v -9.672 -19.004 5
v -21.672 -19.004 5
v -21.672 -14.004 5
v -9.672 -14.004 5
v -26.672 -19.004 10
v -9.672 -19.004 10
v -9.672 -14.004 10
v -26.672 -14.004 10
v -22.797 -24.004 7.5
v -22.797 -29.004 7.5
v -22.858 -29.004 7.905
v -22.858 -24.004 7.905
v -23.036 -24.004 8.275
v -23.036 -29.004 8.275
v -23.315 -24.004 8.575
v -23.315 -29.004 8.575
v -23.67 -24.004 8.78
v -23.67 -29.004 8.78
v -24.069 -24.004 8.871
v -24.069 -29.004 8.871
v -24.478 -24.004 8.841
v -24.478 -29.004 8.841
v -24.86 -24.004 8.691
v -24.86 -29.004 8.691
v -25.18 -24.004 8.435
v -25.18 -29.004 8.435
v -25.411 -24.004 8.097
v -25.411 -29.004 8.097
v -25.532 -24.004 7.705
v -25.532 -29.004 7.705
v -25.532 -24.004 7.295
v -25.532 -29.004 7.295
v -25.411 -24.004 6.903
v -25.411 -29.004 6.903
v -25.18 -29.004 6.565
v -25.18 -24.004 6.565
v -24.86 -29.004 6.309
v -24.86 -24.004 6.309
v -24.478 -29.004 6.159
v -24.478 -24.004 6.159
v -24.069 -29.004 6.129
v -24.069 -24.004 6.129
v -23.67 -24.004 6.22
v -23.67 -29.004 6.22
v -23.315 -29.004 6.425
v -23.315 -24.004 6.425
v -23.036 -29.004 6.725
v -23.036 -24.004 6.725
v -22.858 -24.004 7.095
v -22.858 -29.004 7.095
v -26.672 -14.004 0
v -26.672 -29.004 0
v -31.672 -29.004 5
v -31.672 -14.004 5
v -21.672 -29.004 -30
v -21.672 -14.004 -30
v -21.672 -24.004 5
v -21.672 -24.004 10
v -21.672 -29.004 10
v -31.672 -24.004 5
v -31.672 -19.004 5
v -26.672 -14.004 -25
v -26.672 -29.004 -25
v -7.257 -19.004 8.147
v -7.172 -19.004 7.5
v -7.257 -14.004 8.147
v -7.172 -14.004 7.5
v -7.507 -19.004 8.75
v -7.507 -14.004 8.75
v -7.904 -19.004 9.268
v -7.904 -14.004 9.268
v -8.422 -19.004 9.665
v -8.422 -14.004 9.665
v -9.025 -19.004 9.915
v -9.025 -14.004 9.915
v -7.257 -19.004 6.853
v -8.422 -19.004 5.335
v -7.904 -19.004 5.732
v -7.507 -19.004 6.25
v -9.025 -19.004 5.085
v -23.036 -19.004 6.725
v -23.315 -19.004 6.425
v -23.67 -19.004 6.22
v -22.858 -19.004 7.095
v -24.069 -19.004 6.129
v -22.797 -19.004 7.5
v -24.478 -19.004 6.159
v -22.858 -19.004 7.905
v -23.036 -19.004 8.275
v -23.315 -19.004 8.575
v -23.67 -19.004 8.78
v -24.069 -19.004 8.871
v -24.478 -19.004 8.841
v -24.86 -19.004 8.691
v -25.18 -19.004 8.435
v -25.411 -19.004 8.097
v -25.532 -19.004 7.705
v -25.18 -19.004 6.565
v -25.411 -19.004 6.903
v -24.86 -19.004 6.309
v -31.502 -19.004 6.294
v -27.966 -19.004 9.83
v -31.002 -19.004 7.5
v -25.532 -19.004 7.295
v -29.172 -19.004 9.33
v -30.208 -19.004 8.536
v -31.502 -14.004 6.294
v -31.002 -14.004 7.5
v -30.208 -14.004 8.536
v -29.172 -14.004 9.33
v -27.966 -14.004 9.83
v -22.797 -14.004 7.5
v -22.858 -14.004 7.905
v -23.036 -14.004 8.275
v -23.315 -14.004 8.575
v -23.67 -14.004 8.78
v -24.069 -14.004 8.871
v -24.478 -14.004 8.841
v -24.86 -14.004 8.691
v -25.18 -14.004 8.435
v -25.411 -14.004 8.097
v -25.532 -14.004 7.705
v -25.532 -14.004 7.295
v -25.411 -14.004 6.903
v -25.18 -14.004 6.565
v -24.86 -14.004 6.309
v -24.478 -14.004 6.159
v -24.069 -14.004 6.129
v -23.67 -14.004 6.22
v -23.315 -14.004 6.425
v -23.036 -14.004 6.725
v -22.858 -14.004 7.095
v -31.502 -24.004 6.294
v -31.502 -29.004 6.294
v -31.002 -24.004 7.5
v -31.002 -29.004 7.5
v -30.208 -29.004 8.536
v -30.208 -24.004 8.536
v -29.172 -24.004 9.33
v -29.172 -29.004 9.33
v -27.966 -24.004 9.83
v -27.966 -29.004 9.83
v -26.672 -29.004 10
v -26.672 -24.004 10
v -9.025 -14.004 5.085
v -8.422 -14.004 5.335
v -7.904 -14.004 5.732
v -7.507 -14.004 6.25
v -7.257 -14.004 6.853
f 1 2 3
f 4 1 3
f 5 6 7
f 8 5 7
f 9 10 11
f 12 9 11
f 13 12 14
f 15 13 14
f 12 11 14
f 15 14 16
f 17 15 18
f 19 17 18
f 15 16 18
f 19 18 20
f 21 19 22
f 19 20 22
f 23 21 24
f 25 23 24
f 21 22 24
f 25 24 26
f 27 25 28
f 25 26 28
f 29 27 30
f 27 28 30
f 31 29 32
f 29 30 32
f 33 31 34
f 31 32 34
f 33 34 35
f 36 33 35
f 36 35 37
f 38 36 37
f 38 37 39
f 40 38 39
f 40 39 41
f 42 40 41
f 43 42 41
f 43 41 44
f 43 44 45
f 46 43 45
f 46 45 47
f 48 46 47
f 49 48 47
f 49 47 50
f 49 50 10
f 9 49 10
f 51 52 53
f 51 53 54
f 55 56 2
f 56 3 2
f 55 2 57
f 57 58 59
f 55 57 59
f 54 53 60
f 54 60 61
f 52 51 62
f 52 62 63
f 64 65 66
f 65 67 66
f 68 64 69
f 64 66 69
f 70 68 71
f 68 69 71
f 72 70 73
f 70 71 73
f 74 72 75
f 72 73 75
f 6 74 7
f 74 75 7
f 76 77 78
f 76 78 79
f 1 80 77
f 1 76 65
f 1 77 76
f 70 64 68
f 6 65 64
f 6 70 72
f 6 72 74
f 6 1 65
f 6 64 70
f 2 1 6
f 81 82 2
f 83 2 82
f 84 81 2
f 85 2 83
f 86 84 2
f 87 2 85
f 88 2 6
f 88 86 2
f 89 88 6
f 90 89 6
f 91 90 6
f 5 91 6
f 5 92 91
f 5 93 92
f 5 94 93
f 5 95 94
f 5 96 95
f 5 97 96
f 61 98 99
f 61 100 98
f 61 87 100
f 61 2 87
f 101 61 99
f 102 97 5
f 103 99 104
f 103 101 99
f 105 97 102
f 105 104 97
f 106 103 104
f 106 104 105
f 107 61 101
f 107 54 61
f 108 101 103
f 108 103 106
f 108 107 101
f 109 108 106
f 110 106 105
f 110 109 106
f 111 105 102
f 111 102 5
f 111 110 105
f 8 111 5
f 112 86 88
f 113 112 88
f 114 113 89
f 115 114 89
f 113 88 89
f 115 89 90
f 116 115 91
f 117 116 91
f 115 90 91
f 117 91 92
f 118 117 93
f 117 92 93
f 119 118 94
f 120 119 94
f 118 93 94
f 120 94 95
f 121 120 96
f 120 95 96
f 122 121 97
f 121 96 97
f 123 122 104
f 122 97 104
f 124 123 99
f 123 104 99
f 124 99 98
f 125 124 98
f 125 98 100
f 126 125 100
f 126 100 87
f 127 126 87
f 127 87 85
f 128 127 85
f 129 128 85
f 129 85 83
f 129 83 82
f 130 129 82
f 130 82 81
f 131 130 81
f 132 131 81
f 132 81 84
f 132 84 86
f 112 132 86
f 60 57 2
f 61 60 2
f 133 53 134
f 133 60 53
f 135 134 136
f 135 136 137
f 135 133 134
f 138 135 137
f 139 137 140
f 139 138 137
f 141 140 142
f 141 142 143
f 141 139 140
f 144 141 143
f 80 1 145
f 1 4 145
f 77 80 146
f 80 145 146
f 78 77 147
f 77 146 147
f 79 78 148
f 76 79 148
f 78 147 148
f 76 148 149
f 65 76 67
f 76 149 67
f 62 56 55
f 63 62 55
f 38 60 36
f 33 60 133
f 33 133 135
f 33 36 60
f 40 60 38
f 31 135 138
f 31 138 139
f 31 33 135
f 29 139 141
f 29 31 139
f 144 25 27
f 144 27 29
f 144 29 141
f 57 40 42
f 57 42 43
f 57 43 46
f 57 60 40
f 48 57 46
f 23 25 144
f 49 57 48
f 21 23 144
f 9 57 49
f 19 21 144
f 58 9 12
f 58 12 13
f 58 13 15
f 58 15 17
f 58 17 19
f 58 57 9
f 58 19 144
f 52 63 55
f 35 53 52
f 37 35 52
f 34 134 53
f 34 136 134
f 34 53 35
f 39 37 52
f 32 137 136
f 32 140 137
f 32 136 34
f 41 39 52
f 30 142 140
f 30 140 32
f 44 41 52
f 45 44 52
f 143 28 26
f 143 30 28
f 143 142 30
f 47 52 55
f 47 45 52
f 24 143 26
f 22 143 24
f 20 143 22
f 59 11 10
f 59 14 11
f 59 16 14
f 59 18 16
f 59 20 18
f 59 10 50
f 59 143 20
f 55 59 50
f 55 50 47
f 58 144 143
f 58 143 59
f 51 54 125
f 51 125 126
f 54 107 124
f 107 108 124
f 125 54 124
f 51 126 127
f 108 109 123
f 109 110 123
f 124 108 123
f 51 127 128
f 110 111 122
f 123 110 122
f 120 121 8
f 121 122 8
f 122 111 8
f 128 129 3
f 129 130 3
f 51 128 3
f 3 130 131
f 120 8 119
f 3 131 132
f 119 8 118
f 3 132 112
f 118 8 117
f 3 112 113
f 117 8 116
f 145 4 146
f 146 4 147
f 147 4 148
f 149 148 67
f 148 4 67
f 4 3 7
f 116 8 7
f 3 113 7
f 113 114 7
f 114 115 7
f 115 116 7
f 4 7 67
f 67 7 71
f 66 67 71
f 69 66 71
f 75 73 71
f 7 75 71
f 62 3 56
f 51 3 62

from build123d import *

# Parameters (mm, degrees)
F0_W      = 10
F0_H      = 15
F1_DEPTH  = 5
F2_DEPTH  = 5
F3_R      = 1.375
F4_DEPTH  = 15.001
F5_W      = 5
F5_H      = 5
F6_DEPTH  = 10.001
F7_W      = 5
F7_H      = 5
F8_DEPTH  = 14.5
F9_W      = 5
F9_H      = 15
F10_DEPTH = 30
F11_R     = 2.49999
F12_SIZE  = 4.99999
F13_R     = 5
F14_SIZE  = 4.99999


# Not quite as in the source:
# - a fillet or chamfer is up to 0.001 mm smaller than in the source, because OpenCascade refuses the exact size


with BuildPart() as f1:
    # F0 (on Top) → F1 (new body)
    with BuildSketch(Plane.XY):
        with Locations((-26.6721312702, -21.5040988475)):
            Rectangle(F0_W, F0_H)
    extrude(amount=F1_DEPTH)

    # F2 (add): a face of the model
    f2_faces = [f1.faces().sort_by_distance(p)[0] for p in [
        (-26.6721312702, -21.5040988475, 5),
    ]]
    extrude(f2_faces, amount=F2_DEPTH)

    # F3 (on face) → F4 (cut, through all)
    with BuildSketch(Plane.XZ.offset(29.0040988475)):
        with Locations((-24.1721312702, 7.5)):
            Circle(F3_R)
    extrude(amount=-F4_DEPTH, mode=Mode.SUBTRACT)

    # F5 (on face) → F6 (cut, through all)
    with BuildSketch(Plane.YZ.offset(-21.6721312702)):
        with Locations((-21.5040988475, 7.5)):
            Rectangle(F5_W, F5_H)
    extrude(amount=-F6_DEPTH, mode=Mode.SUBTRACT)

    # F7 (on face) → F8 (join)
    with BuildSketch(Plane.YZ.offset(-21.6721312702)):
        with Locations((-16.5040988475, 7.5)):
            Rectangle(F7_W, F7_H)
    extrude(amount=F8_DEPTH)

    # F9 (on face) → F10 (join)
    with BuildSketch(Plane(origin=(0, 0, 0), x_dir=(1, 0, 0), z_dir=(0, 0, -1))):
        with Locations((-24.1721312702, 21.5040988475)):
            Rectangle(F9_W, F9_H)
    extrude(amount=F10_DEPTH)

    # F11 (radius 2.5 in the source; OpenCascade refuses exactly that, so slightly less here)
    f11_edges = [f1.edges().sort_by_distance(p)[0] for p in [
        (-7.172131, -16.504099, 10),
        (-7.172131, -16.504099, 5),
    ]]
    fillet(f11_edges, radius=F11_R)

    # F12 (size 5 in the source; OpenCascade refuses exactly that, so slightly less here)
    f12_edges = [f1.edges().sort_by_distance(p)[0] for p in [
        (-31.672131, -21.504099, 0),
    ]]
    chamfer(f12_edges, length=F12_SIZE)

    # F13
    f13_edges = [f1.edges().sort_by_distance(p)[0] for p in [
        (-31.672131, -16.504099, 10),
        (-31.672131, -26.504099, 10),
    ]]
    fillet(f13_edges, radius=F13_R)

    # F14 (size 5 in the source; OpenCascade refuses exactly that, so slightly less here)
    f14_edges = [f1.edges().sort_by_distance(p)[0] for p in [
        (-26.672131, -21.504099, -30),
    ]]
    chamfer(f14_edges, length=F14_SIZE)


solid = f1.part
